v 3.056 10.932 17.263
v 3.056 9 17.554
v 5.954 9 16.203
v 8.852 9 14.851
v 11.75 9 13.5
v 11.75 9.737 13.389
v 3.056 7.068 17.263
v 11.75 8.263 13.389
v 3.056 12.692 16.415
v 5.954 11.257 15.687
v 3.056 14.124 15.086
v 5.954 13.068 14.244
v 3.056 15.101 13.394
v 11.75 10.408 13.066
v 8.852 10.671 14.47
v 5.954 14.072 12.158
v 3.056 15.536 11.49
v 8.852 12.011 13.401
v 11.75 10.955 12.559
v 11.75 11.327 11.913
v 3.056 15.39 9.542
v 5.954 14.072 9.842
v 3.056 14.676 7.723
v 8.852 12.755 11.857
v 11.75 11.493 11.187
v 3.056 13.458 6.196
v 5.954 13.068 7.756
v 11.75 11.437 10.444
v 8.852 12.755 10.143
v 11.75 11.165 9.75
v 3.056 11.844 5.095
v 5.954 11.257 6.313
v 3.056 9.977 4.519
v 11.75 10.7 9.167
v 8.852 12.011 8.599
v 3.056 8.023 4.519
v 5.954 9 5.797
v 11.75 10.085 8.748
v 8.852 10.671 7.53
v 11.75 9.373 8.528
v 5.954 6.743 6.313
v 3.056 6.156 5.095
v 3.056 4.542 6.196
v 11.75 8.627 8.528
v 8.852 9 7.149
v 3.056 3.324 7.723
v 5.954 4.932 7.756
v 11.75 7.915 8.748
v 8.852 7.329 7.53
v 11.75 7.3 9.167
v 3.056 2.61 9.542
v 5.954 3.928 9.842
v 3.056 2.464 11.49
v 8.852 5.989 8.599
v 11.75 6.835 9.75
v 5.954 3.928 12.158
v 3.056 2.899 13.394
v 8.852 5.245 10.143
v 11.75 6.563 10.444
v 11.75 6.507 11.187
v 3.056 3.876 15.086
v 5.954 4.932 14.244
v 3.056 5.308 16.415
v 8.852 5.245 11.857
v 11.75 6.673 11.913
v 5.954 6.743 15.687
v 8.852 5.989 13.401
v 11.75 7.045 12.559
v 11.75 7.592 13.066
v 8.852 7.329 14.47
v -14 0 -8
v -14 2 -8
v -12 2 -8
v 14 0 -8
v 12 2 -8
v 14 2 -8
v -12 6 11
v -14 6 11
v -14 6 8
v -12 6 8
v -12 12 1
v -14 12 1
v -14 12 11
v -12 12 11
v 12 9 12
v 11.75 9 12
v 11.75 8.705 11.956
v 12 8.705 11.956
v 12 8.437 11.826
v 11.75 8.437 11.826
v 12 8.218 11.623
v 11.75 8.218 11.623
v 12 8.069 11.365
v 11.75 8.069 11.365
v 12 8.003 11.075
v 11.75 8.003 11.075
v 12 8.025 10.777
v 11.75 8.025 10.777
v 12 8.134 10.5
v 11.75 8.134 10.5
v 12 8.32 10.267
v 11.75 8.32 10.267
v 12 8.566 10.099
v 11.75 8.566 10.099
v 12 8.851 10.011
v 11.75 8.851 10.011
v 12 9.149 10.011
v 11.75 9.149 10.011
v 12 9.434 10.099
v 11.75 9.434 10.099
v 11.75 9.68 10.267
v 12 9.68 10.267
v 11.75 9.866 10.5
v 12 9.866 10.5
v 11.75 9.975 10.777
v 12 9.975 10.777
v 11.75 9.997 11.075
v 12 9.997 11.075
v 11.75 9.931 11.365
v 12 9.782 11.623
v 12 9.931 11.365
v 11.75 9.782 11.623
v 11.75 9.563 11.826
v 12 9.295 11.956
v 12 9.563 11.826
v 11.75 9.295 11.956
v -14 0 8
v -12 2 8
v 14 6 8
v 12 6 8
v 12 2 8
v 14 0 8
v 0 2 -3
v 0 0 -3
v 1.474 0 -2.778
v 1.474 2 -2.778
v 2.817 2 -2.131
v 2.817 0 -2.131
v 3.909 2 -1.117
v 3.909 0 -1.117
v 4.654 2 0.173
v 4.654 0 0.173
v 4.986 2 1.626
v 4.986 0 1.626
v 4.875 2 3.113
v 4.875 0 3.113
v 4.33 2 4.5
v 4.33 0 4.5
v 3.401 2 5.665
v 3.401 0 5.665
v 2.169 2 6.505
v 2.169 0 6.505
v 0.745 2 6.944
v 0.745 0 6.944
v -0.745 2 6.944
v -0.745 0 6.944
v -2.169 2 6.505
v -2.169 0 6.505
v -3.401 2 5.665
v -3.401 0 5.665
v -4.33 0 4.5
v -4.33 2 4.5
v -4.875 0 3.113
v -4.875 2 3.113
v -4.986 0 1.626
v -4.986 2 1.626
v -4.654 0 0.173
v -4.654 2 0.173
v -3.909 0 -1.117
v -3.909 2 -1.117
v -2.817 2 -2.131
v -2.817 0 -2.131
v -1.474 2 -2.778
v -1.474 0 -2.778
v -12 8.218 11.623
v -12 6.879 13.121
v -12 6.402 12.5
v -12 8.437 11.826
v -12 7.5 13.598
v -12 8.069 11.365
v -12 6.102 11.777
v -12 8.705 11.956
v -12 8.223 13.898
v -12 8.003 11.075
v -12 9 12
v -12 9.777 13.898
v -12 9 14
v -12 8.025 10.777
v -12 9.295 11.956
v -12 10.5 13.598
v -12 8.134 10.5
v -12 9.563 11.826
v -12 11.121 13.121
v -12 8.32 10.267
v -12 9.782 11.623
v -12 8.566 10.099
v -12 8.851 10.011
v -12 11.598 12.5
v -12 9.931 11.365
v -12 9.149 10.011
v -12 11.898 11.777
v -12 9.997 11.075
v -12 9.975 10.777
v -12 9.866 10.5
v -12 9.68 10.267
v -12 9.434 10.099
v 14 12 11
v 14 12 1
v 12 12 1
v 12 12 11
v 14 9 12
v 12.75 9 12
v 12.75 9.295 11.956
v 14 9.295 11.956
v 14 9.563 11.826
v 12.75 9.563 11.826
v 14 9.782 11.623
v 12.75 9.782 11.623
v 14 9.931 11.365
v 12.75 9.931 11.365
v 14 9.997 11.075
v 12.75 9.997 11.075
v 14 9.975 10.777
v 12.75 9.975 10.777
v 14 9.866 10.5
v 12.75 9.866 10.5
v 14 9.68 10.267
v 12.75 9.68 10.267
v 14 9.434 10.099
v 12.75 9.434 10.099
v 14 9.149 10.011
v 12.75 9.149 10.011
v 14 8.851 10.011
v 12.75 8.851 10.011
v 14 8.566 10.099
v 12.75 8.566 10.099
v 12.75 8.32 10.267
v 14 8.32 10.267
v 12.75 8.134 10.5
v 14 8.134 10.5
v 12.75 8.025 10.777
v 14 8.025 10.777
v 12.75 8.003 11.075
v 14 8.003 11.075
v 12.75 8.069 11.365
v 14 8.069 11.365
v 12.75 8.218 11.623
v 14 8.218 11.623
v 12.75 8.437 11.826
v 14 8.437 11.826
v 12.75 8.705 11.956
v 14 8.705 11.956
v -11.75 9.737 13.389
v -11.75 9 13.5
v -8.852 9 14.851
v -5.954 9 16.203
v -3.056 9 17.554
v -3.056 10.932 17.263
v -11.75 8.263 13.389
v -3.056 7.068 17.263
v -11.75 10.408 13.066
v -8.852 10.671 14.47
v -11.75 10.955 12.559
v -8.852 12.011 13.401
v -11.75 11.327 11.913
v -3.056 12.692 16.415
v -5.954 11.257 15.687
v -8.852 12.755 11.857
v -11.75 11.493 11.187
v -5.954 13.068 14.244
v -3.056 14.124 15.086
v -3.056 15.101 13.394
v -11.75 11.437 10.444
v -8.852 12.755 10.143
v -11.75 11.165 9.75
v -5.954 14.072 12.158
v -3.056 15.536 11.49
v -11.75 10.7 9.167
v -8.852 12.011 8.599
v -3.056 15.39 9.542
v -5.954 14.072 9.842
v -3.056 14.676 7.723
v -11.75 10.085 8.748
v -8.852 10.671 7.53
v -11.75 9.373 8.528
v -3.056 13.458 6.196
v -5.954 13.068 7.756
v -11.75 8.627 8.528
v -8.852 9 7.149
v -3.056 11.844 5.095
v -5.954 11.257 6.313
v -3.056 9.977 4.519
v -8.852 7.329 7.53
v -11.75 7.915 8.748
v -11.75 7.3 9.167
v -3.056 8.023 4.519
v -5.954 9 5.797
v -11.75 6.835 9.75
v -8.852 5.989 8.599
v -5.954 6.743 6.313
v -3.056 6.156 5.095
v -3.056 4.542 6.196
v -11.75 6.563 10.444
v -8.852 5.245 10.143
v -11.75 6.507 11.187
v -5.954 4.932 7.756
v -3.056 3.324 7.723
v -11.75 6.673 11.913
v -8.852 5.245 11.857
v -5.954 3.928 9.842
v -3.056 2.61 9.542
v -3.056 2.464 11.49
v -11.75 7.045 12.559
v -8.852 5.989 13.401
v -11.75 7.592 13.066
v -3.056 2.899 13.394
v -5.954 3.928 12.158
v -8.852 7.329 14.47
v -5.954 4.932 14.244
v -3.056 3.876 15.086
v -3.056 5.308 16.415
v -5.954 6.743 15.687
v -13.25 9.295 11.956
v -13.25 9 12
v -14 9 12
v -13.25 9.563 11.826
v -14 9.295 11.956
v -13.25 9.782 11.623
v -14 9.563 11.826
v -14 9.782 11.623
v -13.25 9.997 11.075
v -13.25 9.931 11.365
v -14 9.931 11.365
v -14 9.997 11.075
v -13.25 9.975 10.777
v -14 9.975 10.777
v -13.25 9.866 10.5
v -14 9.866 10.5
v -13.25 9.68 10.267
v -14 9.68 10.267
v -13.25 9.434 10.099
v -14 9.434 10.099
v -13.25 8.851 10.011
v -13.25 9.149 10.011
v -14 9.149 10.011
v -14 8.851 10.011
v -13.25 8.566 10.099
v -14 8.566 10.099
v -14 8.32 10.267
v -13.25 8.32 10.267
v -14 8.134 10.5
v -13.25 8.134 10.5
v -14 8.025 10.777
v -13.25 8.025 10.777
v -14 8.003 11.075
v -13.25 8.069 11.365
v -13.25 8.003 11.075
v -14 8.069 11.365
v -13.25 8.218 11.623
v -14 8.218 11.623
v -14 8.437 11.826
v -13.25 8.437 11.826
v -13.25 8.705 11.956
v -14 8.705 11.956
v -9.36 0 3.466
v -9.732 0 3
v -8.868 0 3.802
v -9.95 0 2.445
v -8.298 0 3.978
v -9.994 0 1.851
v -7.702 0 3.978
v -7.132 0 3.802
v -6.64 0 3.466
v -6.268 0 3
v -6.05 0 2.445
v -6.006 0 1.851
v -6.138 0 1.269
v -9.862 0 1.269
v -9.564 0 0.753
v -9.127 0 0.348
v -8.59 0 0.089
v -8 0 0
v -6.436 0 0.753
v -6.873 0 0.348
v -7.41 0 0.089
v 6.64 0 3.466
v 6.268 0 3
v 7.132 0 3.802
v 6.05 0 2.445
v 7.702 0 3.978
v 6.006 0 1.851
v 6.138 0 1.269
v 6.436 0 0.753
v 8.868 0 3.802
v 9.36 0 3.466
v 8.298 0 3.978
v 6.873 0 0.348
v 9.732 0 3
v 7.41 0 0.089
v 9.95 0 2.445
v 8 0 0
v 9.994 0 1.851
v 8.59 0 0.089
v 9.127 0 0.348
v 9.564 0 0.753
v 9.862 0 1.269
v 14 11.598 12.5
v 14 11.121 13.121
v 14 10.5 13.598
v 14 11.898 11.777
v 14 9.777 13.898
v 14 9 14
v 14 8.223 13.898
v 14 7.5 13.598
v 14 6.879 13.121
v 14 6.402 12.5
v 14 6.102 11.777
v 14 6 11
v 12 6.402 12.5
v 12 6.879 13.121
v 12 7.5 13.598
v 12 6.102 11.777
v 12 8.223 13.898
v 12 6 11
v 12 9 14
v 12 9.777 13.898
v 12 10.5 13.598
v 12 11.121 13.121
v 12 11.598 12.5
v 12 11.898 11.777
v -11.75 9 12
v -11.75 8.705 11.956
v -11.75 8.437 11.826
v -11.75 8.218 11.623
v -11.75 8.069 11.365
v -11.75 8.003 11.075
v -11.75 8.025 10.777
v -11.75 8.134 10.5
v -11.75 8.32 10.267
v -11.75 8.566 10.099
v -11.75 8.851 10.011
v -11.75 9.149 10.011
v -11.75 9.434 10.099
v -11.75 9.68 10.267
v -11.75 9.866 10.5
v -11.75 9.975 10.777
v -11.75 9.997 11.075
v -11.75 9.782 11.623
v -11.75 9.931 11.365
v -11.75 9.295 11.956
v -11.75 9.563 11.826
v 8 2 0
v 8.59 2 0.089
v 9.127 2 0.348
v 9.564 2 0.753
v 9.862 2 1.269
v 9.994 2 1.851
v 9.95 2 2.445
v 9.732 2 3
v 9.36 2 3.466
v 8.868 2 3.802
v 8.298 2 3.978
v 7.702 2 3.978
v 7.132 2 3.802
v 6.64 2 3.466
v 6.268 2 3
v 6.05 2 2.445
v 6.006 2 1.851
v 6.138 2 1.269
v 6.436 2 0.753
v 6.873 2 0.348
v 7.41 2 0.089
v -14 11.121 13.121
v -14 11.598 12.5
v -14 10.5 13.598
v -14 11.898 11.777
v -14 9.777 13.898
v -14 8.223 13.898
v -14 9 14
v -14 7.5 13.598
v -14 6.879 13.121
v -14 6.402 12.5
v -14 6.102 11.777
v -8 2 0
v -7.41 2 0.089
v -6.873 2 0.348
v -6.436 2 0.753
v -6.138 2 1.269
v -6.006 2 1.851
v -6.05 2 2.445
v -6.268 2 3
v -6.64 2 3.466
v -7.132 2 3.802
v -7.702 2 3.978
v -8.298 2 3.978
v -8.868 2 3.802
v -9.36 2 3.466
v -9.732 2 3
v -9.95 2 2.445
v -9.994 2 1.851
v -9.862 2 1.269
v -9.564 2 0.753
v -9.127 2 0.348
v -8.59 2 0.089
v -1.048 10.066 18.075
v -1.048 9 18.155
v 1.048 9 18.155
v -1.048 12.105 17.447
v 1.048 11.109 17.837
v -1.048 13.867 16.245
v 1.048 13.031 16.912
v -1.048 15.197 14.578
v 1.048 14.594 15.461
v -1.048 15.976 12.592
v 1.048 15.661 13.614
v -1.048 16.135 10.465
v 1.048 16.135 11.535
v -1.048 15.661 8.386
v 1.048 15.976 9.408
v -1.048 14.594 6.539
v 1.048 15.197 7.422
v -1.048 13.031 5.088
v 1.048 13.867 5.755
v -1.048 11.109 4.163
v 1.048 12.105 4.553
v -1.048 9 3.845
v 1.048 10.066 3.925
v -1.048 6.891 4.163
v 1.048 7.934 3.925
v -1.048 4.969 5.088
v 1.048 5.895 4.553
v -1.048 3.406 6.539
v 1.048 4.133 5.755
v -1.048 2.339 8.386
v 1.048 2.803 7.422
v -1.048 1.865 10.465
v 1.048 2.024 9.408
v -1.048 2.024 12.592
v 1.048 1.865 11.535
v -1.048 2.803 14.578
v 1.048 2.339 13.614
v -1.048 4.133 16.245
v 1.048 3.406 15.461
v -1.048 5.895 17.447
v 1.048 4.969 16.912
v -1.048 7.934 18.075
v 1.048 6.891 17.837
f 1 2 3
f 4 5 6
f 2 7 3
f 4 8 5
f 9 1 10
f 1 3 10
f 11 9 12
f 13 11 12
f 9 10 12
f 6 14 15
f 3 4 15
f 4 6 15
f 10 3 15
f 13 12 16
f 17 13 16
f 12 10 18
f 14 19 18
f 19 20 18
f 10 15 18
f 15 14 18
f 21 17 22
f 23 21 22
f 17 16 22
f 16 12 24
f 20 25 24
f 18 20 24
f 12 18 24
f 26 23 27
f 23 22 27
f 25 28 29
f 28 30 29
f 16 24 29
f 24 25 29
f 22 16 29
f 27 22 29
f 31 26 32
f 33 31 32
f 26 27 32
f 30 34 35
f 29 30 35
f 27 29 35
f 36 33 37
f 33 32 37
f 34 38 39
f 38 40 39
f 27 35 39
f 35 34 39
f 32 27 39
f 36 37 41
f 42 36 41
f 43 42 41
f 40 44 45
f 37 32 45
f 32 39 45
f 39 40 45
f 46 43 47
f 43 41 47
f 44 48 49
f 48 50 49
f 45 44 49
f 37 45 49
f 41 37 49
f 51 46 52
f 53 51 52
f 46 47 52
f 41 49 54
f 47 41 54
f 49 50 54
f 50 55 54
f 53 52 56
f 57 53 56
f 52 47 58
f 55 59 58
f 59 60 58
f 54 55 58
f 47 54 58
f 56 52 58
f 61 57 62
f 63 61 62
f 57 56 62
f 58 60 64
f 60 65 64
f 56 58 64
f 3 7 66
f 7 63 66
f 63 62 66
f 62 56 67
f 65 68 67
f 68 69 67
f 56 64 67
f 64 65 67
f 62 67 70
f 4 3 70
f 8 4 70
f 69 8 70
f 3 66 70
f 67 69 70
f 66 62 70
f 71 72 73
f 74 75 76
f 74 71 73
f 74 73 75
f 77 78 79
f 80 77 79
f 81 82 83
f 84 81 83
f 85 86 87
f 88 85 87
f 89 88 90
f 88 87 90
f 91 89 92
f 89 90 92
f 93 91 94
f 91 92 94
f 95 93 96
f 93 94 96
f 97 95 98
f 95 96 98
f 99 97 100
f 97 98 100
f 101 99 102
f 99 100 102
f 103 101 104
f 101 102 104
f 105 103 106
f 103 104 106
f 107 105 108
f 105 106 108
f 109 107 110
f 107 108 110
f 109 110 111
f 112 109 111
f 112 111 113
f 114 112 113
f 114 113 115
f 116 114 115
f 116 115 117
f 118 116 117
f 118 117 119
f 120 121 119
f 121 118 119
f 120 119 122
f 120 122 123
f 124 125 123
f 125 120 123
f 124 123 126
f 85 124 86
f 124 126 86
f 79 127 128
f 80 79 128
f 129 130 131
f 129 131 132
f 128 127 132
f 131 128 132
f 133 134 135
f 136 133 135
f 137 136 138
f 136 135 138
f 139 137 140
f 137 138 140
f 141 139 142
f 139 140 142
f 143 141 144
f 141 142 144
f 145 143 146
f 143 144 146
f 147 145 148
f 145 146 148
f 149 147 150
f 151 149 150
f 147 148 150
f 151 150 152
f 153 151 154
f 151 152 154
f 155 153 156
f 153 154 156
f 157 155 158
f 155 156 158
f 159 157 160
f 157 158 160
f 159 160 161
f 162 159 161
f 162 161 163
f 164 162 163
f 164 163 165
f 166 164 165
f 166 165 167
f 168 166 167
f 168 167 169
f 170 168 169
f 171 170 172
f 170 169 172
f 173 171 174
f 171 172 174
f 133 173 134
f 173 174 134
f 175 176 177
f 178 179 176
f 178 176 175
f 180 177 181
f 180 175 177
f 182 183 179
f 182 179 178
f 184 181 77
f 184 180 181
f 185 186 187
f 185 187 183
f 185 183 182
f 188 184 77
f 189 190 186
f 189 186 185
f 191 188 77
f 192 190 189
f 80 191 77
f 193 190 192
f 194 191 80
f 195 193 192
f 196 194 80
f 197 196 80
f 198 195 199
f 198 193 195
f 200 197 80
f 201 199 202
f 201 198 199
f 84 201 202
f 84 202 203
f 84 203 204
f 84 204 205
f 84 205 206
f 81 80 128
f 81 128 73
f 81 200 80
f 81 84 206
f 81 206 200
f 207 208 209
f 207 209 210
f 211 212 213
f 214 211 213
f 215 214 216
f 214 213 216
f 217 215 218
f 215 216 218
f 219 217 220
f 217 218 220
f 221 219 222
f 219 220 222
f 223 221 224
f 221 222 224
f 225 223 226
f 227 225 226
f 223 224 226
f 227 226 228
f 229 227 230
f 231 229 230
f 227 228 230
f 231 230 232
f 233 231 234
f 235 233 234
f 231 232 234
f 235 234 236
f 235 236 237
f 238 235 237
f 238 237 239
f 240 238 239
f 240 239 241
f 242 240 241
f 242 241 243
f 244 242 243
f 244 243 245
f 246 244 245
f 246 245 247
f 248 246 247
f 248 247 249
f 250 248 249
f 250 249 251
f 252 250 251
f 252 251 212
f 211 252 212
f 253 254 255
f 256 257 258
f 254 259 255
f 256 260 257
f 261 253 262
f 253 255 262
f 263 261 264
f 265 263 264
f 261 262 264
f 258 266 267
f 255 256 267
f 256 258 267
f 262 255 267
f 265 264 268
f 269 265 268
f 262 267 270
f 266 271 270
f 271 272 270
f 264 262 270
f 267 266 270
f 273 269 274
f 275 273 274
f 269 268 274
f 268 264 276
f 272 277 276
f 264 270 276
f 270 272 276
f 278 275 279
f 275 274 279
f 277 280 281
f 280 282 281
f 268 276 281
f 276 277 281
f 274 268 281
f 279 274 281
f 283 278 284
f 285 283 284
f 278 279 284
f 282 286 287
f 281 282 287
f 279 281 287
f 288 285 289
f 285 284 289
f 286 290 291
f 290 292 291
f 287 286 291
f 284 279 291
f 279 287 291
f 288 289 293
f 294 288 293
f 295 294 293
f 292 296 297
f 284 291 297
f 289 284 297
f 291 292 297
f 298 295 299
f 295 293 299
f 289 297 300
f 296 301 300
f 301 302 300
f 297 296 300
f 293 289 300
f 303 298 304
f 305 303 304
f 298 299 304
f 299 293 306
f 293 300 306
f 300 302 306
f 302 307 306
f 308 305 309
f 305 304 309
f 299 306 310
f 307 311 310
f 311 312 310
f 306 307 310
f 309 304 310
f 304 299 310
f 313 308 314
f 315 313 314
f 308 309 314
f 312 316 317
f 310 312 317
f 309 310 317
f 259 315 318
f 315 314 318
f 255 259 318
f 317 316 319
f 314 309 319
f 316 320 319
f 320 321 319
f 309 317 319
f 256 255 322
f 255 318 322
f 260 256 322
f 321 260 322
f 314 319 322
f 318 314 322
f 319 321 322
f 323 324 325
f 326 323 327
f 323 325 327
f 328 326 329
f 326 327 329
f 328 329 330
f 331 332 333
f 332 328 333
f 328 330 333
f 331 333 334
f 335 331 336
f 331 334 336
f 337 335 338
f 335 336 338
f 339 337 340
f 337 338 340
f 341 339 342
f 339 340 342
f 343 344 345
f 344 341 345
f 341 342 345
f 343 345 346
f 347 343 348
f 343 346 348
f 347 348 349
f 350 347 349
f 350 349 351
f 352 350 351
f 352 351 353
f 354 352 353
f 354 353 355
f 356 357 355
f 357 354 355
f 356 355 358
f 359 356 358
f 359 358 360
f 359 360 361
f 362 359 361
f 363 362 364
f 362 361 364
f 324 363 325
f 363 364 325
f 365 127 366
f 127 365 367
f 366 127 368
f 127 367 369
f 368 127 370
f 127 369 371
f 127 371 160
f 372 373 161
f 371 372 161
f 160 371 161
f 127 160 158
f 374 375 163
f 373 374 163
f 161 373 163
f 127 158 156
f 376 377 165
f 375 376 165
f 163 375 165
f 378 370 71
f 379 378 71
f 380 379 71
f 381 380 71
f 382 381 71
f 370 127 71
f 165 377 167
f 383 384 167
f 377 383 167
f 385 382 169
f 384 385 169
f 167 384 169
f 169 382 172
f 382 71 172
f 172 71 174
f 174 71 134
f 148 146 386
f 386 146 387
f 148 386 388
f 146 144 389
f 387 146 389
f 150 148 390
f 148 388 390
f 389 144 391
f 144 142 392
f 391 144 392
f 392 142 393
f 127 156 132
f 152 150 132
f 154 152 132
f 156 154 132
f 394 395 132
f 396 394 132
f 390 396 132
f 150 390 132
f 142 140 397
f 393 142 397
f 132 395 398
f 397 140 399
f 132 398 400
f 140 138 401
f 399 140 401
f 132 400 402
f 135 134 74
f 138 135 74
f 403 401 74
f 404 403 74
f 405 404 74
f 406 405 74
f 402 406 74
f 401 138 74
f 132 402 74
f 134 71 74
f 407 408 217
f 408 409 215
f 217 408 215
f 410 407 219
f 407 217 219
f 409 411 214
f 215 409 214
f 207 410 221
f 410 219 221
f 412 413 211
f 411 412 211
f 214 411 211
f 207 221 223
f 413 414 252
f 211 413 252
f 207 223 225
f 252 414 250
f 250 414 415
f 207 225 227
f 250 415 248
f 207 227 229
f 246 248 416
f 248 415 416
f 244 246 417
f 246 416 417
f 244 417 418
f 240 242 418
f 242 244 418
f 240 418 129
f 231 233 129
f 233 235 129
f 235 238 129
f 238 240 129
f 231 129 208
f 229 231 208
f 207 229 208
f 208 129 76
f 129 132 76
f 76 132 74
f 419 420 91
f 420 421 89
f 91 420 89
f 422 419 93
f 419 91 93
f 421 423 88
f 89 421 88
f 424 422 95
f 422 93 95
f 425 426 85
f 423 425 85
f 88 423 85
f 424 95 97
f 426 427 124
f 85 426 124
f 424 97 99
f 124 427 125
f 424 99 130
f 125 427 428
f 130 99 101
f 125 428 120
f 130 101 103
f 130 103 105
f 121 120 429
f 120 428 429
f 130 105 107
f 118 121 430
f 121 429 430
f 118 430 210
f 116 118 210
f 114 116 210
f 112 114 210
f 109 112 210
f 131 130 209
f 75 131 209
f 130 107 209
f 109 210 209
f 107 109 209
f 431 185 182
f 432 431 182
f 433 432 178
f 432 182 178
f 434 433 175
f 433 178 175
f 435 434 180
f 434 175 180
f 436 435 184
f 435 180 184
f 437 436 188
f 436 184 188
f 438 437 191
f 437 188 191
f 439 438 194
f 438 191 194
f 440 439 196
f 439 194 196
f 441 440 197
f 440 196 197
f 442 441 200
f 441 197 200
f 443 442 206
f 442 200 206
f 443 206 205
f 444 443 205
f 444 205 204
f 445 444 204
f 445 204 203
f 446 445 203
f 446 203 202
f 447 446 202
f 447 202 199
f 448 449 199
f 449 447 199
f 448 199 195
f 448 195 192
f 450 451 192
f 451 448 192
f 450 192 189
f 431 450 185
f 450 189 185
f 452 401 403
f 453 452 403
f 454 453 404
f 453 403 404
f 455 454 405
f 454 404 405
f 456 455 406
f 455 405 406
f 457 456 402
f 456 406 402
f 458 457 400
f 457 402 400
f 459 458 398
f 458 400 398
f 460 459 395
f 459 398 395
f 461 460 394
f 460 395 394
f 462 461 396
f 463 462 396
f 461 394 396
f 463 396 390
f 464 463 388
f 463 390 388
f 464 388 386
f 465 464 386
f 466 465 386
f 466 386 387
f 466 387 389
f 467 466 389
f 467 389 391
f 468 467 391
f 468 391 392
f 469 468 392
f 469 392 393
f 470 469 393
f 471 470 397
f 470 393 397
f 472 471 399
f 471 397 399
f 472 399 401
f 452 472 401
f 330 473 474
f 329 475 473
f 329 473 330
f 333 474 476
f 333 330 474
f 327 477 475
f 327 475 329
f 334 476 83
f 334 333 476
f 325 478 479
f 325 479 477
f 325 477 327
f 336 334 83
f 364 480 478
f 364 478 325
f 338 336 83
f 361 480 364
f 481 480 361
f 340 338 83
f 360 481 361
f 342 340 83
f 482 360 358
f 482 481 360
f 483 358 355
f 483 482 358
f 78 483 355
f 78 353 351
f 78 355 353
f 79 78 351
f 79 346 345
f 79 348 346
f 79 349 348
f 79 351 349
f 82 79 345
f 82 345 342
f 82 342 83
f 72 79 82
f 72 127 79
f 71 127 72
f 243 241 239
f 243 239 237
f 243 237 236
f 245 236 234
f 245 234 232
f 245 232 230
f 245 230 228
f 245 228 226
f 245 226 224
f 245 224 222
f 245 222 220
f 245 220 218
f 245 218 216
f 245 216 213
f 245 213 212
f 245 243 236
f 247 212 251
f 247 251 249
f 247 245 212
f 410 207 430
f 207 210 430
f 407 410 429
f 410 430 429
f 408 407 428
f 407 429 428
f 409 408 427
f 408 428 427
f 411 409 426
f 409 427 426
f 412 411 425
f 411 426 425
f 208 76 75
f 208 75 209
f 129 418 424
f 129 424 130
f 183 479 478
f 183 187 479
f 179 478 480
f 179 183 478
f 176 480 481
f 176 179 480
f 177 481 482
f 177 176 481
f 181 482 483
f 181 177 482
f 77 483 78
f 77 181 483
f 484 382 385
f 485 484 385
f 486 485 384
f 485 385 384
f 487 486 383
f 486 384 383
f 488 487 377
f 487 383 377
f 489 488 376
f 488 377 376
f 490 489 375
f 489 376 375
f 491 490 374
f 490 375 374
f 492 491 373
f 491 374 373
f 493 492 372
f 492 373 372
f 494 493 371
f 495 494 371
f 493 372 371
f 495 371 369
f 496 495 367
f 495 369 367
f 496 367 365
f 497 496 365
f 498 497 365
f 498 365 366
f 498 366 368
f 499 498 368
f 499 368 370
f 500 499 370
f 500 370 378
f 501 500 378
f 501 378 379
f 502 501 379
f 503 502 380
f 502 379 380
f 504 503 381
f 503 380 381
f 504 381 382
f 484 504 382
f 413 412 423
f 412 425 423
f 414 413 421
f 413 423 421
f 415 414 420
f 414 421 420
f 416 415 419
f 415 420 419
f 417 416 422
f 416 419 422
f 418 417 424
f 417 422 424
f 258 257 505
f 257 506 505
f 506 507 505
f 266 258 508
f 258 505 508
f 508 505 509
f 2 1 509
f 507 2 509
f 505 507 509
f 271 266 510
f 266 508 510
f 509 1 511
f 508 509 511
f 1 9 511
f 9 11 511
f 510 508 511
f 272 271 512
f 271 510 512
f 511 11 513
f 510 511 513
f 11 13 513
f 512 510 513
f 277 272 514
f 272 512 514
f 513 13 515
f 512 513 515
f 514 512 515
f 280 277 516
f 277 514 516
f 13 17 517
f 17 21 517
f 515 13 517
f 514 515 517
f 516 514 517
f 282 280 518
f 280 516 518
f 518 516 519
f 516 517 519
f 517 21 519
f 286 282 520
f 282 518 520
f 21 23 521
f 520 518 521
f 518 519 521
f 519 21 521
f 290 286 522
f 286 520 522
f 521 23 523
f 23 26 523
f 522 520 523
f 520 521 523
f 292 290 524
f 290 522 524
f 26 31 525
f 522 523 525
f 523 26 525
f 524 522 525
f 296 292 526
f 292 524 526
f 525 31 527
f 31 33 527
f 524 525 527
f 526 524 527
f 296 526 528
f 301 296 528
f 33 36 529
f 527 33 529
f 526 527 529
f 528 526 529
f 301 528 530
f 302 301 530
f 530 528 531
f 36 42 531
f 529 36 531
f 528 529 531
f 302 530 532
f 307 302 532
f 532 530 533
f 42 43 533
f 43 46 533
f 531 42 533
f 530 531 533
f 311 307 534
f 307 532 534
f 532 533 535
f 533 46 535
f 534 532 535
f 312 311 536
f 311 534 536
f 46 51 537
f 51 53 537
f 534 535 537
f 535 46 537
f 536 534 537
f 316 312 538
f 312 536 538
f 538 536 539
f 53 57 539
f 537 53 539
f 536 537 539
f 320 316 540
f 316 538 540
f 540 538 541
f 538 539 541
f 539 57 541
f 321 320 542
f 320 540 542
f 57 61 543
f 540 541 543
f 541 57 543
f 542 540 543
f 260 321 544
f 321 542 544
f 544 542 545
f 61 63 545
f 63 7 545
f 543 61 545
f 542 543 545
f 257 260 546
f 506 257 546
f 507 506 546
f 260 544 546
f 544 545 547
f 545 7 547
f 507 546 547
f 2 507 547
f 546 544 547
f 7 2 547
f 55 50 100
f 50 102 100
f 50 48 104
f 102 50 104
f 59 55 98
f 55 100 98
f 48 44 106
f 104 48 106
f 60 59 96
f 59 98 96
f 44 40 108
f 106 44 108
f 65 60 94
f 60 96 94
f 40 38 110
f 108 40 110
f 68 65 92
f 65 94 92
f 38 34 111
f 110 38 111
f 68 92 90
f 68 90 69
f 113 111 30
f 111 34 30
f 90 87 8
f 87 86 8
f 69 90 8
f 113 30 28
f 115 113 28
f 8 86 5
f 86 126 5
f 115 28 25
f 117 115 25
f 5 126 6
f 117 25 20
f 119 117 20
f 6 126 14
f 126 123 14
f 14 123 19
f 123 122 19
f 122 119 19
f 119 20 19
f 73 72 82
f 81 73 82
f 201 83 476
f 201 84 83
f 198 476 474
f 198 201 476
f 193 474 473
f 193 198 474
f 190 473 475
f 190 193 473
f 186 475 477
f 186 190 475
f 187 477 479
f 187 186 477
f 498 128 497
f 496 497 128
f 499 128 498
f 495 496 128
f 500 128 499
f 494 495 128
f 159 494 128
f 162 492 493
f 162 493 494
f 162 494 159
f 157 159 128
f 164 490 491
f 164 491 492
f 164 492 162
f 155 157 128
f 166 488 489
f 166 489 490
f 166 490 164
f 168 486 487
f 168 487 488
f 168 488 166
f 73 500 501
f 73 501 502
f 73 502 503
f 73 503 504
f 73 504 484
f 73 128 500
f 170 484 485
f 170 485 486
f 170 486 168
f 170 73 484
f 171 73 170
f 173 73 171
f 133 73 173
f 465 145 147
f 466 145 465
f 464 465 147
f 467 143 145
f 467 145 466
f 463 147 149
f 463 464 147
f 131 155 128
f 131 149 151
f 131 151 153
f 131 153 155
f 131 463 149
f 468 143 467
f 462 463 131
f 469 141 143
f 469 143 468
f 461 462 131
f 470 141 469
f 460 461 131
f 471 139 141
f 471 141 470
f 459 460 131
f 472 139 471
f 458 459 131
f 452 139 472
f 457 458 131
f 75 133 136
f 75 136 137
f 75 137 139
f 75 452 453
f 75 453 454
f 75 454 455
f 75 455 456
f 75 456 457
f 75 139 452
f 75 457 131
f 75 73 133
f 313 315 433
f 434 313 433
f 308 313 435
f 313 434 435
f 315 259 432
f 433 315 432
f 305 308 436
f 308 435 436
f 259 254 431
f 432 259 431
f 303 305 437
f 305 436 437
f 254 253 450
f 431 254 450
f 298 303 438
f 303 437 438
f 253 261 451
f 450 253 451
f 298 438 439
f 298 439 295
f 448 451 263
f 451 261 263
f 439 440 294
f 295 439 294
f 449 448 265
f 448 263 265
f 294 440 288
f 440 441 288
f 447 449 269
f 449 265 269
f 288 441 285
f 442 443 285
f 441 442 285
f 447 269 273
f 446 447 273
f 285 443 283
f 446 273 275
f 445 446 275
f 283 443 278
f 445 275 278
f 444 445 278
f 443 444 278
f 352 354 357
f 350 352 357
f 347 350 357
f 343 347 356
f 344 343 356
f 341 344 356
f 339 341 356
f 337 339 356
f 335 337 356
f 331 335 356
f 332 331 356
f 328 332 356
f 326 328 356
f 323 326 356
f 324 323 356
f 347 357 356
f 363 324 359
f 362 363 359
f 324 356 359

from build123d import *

# Parameters (mm, degrees)
SKETCH_1_W           = 28
SKETCH_1_H           = 16
EXTRUDE_1_DEPTH      = 2
EXTRUDE_2_DEPTH      = 2
FILLET_1_R           = 3
SKETCH_3_R           = 1
CUT_EXTRUDE_1_DEPTH  = 34.526109228
EXTRUDE_3_DEPTH      = 1
EXTRUDE_3_DEPTH_BACK = 25
SKETCH_5_R           = 1
SKETCH_6_R           = 2
SKETCH_6_R_2         = 5
CUT_EXTRUDE_2_DEPTH  = 2


with BuildPart() as part:
    # 草图1 → 凸台-拉伸1 (new body)
    with BuildSketch(Plane(origin=(0, 0, 0), x_dir=(1, 0, 0), z_dir=(0, 1, 0))):
        Rectangle(SKETCH_1_W, SKETCH_1_H)
    extrude(amount=EXTRUDE_1_DEPTH)

    # 草图2 → 凸台-拉伸2 (add)
    with BuildSketch(Plane.ZY.offset(14)):
        Polygon((-8, 0), (-8, 2), (1, 12), (14, 12), (14, 6), (8, 6), (8, 2), (8, 0), align=None)
    extrude_2 = extrude(amount=-EXTRUDE_2_DEPTH)

    # 镜向1: 凸台-拉伸2 across plane
    add(extrude_2.mirror(Plane(origin=(0, 0, 0), x_dir=(0, 0, 1), z_dir=(1, 0, 0))))

    # 圆角1
    fillet_1_edges = [part.edges().sort_by_distance(p)[0] for p in [
        (13, 6, 14),
        (13, 12, 14),
        (-13, 6, 14),
        (-13, 12, 14),
    ]]
    fillet(fillet_1_edges, radius=FILLET_1_R - 0.0001)  # a hair under: the kernel refuses the full size

    # 草图3 → 切除-拉伸1 (cut, through all)
    with BuildSketch(Plane.ZY.offset(14)):
        with Locations((11, 9)):
            Circle(SKETCH_3_R)
    extrude(amount=-CUT_EXTRUDE_1_DEPTH, mode=Mode.SUBTRACT)



with BuildPart() as body_2:
    # 草图4 → 旋转2 (revolve)
    with BuildSketch(Plane(origin=(0, 9, 0), x_dir=(1, 0, 0), z_dir=(0, 1, 0))):
        with BuildLine():
            Line((-11.75, -11), (-11.75, -13.5))
            Line((-11.75, -13.5), (-3.056178347, -17.553995615))
            ThreePointArc((-3.056178347, -17.553995615), (0, -18.231534043), (3.056178347, -17.553995615))
            Line((3.056178347, -17.553995615), (11.75, -13.5))
            Line((11.75, -13.5), (11.75, -11))
            Line((11.75, -11), (-11.75, -11))
        make_face()
    revolve(axis=Axis((14, 9, 11), (-1, 0, 0)))


with BuildPart() as part_1:
    add(part.part)

    add(body_2.part)  # 凸台-拉伸3 merges body 2
    # 草图5 → 凸台-拉伸3 (add, two sides: drawn at the far end of the back side and taken through both)
    with BuildSketch(Plane(origin=(11.75, 0, 0), x_dir=(0, 0, -1), z_dir=(1, 0, 0)).offset(-EXTRUDE_3_DEPTH_BACK)):
        with Locations(Location((-11, 9, 0), (0, 0, 180))):
            Circle(SKETCH_5_R)
    extrude(amount=EXTRUDE_3_DEPTH + EXTRUDE_3_DEPTH_BACK)

    # 草图6 → 切除-拉伸2 (cut)
    with BuildSketch(Plane.XZ):
        with Locations(Location((-8, 2, 0), (0, 0, 270))):
            Circle(SKETCH_6_R)
        with Locations(Location((8, 2, 0), (0, 0, 270))):
            Circle(SKETCH_6_R)
        with Locations(Location((0, 2, 0), (0, 0, 270))):
            Circle(SKETCH_6_R_2)
    extrude(amount=-CUT_EXTRUDE_2_DEPTH, mode=Mode.SUBTRACT)


solid = part_1.part
